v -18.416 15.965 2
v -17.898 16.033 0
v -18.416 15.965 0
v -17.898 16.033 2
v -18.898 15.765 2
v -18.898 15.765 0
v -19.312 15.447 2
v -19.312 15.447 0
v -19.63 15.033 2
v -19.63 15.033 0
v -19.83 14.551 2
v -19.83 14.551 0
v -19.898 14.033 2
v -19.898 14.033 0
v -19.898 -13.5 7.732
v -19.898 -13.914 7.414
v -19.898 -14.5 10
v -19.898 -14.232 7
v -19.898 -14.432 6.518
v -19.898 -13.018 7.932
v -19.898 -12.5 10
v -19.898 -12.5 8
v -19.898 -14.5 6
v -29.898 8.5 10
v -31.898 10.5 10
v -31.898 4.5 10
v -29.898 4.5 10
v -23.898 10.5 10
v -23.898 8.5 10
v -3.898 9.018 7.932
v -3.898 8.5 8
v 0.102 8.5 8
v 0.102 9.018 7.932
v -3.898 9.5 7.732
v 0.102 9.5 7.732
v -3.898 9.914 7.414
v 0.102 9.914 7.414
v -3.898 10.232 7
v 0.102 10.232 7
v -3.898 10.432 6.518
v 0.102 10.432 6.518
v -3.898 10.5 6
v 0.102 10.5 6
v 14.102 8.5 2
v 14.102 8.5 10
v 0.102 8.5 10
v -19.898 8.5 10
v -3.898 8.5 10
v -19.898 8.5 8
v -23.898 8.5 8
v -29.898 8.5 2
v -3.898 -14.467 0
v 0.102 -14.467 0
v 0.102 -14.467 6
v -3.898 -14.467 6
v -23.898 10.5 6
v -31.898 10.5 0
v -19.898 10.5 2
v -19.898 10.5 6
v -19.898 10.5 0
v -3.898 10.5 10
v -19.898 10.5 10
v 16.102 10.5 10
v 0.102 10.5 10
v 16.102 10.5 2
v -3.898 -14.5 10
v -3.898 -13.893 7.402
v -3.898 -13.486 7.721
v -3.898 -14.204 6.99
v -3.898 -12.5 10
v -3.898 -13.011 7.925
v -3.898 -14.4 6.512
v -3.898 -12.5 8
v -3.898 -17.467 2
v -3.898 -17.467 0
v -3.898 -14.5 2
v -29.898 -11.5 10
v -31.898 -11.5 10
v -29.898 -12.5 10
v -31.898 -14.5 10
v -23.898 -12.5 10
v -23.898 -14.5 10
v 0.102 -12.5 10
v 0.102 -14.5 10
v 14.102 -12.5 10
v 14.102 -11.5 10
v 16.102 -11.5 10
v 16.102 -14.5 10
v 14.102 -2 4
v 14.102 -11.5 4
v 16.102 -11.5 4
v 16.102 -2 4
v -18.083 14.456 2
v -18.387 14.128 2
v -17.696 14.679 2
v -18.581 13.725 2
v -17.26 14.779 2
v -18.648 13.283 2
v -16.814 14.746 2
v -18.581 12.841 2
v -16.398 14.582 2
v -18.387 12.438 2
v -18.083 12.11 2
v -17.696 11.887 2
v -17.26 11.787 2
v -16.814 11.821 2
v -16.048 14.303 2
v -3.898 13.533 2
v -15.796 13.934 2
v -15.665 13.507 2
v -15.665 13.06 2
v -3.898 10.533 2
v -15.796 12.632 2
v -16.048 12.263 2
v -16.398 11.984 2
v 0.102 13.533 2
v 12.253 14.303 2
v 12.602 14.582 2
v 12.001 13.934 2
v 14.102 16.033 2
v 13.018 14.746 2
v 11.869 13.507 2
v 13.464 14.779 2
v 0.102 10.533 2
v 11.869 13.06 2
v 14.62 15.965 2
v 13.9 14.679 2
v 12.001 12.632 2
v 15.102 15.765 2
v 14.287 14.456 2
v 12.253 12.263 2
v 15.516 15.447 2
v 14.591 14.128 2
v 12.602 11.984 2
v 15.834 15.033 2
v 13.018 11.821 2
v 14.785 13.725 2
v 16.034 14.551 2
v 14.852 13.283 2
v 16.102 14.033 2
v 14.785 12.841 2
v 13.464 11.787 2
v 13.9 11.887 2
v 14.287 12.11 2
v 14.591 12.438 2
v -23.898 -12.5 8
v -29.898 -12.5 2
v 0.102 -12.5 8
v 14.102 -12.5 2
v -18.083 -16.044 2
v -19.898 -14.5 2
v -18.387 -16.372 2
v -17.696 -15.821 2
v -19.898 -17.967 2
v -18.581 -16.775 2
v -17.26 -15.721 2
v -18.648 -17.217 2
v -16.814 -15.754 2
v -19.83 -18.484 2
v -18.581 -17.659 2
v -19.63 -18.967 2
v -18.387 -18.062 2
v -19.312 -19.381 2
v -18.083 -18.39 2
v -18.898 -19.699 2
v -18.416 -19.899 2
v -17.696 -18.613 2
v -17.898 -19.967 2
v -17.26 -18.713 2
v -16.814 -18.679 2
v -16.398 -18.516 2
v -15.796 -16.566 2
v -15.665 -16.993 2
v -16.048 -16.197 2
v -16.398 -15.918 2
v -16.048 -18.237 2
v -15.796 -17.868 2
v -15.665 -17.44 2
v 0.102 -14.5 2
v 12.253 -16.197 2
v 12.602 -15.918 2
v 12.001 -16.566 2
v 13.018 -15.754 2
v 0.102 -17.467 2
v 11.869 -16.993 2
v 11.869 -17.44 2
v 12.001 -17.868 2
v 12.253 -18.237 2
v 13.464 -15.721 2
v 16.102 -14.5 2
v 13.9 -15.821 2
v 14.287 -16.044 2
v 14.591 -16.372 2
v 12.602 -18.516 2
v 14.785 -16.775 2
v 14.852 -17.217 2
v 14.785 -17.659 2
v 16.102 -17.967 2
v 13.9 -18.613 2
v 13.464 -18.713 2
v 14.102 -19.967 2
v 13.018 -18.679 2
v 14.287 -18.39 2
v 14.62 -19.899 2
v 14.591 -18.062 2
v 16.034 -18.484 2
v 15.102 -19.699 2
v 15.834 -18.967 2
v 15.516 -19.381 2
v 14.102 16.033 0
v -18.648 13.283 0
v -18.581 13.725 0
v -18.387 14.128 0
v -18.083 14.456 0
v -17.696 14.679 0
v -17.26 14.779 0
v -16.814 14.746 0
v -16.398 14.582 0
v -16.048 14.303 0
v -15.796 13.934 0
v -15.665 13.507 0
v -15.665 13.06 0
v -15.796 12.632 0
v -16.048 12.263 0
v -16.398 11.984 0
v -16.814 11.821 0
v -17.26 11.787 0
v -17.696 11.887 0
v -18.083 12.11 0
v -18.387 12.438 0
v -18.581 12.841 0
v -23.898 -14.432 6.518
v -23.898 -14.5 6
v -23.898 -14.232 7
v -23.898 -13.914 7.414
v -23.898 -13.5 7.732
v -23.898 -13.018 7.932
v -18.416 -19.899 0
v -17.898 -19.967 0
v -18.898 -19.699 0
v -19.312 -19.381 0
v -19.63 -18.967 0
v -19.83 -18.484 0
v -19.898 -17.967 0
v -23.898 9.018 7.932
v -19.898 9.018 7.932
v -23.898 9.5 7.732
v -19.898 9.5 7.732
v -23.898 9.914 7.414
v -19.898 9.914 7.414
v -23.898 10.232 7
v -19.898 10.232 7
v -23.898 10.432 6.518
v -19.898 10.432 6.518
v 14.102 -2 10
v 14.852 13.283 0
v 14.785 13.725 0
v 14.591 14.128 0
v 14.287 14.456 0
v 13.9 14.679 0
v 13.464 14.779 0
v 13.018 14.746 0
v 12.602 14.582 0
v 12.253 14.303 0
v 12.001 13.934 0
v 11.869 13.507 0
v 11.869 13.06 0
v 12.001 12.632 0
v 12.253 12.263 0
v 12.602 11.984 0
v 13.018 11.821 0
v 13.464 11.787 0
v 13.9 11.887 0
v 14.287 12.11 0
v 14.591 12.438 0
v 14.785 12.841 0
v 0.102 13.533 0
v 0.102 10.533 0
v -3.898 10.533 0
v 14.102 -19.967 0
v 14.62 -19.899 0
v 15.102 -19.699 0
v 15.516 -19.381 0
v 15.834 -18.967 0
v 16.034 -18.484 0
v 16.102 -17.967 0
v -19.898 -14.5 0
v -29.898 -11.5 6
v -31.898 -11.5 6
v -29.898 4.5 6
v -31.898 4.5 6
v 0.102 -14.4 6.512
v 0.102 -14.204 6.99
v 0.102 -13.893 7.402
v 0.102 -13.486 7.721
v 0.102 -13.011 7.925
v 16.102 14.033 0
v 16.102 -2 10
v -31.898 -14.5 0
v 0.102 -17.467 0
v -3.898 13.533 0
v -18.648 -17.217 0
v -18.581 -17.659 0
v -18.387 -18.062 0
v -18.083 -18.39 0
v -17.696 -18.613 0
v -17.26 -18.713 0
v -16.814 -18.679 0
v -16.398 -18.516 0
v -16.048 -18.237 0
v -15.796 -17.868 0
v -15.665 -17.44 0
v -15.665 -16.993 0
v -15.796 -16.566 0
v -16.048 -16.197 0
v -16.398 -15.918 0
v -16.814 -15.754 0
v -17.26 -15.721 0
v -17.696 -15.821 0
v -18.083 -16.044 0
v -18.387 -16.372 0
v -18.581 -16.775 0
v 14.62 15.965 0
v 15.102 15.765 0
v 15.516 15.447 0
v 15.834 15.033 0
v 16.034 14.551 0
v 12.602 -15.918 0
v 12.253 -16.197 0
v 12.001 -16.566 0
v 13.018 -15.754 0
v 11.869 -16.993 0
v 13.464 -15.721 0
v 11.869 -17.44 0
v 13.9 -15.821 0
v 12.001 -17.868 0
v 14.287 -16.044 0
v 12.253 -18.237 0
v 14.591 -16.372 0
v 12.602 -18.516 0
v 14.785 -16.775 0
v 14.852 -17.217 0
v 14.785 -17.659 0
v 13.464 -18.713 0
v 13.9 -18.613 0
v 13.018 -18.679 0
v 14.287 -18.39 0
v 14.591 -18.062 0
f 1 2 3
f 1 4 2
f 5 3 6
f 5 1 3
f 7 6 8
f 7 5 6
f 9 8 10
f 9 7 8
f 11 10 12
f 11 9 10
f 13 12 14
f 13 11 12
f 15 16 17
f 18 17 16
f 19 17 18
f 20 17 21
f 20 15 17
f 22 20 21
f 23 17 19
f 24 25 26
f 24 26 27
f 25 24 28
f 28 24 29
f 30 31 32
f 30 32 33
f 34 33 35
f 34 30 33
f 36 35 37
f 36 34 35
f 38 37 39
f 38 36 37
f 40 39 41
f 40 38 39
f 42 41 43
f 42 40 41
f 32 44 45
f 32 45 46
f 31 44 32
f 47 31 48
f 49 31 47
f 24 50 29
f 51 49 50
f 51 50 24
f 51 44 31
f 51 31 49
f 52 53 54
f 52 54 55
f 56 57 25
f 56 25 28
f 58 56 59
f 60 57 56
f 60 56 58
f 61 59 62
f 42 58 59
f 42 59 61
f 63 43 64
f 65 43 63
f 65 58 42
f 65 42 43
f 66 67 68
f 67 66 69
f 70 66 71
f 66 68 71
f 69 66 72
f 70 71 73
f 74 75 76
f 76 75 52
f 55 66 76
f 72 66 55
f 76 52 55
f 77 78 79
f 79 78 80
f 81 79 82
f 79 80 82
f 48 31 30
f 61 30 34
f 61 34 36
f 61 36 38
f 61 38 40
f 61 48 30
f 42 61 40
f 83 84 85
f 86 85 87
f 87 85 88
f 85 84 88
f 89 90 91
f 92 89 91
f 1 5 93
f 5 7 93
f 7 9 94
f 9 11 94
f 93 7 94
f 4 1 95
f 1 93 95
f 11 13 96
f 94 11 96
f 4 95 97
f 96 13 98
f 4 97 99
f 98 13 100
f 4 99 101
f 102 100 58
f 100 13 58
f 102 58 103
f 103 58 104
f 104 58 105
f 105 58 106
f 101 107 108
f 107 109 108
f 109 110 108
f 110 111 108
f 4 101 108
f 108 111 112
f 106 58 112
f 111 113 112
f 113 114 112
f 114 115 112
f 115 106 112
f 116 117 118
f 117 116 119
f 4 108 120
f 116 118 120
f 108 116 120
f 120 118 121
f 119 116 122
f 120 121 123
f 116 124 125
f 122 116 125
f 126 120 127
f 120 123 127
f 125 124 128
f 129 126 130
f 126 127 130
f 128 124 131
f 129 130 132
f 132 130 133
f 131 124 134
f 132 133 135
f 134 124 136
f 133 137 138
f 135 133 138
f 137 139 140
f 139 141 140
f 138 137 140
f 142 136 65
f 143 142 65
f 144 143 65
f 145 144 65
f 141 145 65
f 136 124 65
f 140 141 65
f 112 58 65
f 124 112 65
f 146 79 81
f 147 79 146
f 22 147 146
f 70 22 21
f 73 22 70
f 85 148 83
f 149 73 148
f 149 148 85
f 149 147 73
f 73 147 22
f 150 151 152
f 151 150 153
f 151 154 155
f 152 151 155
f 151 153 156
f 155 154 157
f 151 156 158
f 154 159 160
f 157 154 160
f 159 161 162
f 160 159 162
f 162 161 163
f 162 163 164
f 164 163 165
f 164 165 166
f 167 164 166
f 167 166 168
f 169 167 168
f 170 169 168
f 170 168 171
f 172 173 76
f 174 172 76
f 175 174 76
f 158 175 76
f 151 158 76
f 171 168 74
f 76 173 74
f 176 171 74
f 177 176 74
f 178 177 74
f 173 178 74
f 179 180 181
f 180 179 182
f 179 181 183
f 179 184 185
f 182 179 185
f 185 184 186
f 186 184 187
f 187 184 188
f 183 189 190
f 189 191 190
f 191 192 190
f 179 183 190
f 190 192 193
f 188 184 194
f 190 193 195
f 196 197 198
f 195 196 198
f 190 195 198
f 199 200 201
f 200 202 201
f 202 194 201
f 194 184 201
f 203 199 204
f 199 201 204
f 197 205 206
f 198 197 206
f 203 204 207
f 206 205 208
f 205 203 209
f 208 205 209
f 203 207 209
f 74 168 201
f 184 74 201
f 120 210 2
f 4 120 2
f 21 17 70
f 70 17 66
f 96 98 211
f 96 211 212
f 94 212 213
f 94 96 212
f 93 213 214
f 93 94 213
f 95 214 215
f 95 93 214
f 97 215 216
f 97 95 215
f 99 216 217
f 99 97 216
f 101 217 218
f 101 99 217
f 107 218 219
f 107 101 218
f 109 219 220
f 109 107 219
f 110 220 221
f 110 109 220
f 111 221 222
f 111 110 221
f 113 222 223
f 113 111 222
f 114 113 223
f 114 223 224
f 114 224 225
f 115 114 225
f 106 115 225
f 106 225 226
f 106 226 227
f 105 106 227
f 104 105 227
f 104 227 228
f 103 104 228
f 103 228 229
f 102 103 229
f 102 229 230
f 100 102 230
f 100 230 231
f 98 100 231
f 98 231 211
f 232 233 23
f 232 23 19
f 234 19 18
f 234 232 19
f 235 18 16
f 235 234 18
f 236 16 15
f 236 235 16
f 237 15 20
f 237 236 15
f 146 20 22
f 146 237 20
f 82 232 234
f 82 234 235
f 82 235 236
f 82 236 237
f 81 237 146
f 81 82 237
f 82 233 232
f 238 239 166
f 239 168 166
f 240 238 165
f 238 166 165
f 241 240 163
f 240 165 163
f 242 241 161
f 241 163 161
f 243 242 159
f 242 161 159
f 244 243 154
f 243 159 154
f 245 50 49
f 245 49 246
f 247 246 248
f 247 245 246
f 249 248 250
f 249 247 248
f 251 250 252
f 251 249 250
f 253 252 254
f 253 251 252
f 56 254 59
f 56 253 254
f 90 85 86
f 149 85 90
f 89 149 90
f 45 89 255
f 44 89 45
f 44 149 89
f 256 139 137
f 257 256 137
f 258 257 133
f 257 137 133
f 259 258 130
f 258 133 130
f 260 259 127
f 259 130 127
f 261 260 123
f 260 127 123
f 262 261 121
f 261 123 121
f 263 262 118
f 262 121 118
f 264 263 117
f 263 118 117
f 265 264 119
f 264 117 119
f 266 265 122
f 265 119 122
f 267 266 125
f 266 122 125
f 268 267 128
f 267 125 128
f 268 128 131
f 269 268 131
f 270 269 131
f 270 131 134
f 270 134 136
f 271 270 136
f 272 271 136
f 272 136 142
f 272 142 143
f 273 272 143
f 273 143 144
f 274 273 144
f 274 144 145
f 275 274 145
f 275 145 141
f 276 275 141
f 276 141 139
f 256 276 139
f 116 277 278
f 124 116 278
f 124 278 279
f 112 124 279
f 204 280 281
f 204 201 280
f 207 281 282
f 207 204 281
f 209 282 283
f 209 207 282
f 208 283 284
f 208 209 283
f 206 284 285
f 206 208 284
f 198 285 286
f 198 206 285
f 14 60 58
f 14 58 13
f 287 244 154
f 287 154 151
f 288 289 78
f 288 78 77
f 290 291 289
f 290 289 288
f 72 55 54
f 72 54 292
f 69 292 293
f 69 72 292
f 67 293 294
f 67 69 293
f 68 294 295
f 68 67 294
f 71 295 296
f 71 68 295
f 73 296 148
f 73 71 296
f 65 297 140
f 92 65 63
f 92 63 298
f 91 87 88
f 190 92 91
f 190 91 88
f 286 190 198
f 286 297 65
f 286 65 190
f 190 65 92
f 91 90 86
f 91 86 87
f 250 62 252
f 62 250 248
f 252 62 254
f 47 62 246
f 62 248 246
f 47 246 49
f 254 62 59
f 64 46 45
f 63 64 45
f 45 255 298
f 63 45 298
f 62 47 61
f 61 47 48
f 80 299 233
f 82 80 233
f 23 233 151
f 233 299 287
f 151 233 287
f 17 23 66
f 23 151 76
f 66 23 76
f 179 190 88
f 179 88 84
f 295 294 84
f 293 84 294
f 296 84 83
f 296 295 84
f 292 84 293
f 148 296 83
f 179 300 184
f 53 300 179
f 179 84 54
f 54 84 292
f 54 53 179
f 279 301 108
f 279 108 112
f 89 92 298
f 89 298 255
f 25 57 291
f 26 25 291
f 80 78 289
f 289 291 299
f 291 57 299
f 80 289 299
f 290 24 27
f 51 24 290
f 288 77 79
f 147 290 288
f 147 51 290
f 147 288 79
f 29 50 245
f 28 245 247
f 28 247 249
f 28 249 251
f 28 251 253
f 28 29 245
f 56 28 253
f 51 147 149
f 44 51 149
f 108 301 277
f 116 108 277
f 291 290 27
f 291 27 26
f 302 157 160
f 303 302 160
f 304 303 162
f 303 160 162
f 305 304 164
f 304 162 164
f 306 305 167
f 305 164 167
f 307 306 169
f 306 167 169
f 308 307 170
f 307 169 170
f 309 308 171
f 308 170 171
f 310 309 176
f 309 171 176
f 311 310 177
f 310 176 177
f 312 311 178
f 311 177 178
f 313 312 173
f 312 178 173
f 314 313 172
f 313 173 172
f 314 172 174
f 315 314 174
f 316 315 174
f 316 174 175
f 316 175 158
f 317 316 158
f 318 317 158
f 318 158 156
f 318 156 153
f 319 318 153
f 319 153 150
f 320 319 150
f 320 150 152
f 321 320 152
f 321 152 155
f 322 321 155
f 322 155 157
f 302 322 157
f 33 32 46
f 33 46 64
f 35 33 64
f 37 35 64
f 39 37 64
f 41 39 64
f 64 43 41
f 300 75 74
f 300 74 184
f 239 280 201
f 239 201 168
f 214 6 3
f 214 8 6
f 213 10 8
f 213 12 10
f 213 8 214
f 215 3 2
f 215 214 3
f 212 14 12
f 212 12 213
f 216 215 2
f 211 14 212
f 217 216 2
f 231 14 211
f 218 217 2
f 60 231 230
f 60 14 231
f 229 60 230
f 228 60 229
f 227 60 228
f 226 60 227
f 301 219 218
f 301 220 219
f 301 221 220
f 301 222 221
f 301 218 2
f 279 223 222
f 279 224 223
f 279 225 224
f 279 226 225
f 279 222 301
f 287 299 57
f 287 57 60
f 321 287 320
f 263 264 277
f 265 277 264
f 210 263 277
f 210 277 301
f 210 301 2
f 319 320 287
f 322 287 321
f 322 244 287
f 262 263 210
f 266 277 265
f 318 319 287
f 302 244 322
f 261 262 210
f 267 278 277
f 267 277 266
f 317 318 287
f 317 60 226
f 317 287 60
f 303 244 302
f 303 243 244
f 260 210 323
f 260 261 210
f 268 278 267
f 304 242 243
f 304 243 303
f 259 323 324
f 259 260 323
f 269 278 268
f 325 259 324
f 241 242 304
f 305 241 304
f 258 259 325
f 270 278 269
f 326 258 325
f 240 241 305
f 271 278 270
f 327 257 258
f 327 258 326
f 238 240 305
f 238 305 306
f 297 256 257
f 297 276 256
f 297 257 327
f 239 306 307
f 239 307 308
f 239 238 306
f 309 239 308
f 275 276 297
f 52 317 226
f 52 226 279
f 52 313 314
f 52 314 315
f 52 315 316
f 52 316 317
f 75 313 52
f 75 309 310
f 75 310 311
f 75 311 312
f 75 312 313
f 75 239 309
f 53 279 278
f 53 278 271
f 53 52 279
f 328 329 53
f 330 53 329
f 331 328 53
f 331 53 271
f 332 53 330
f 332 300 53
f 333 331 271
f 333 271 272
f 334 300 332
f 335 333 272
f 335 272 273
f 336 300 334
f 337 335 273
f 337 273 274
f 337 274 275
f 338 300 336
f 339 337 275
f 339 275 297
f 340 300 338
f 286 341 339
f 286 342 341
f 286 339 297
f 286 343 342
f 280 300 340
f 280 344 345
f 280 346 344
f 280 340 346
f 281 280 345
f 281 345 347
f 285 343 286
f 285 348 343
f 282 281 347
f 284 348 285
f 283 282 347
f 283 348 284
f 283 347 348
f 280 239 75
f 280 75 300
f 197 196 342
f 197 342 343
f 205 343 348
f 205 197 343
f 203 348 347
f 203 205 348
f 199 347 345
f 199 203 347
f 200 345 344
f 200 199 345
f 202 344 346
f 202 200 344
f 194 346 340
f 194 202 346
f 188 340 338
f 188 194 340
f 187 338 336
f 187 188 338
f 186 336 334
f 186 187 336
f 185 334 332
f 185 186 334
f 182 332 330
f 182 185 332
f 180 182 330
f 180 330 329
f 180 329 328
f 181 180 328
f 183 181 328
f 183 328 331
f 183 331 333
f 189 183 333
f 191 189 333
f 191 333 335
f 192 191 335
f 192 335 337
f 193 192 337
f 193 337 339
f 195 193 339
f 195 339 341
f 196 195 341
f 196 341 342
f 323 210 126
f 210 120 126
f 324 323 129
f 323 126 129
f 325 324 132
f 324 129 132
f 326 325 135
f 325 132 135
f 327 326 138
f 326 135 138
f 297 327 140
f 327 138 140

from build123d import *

# Parameters (mm, degrees)
F1_DEPTH     = 2
F2_R         = 2
F3_D         = 3
F6_W         = 2
F6_H         = 9.5
F7_DEPTH     = 2
F6_W_2       = 4
F6_H_2       = 2
F6_H_3       = 1.9668334348
F8_DEPTH     = 8
F6_W_3       = 16
F9_DEPTH     = 10
F10_T1_DEPTH = 4
F10_T3_DEPTH = 4
F11_DEPTH    = 4
F6_H_4       = 16
F12_DEPTH    = 6


# Not quite as in the source:
# - a fillet or chamfer that OpenCascade refuses, or shapes differently, is made with other operations: its cross-section is extruded or revolved along the edge and cut away or added
# - a feature names something its author has since deleted; it is built from what else it names


with BuildPart() as f1:
    # F0 (on Top) → F1 (new body)
    with BuildSketch(Plane.XY):
        Polygon((-19.8978664808, -19.9668334348), (-1.8978664808, -19.9668334348), (-1.8978664808, -17.4668334348), (-3.8978664808, -17.4668334348), (-3.8978664808, -14.4668334348), (-1.8978664808, -14.4668334348), (-1.8978664808, -1.9668334348), (-19.8978664808, -1.9668334348), align=None)
    extrude(amount=F1_DEPTH)

    # F2
    f2_edges = [f1.edges().sort_by_distance(p)[0] for p in [
        (-19.897866, -19.966833, 1),
    ]]
    fillet(f2_edges, radius=F2_R)

    # F3 (through all)
    with Locations(Plane(origin=(0, 0, 0), x_dir=(1, 0, 0), z_dir=(0, 0, -1))):
        with Locations((-17.1478664808, 17.2168334348)):
            Hole(F3_D / 2)

    # F4: F1 across face


with BuildPart() as f1_1:
    add(f1.part)
    add(f1.part.mirror(Plane(origin=(-1.8978664808, -8.2168334348, 1), x_dir=(0, 1, 0), z_dir=(1, 0, 0))))

    # F5: F1 across face


with BuildPart() as f1_2:
    add(f1_1.part)
    add(f1_1.part.mirror(Plane(origin=(-1.8978664808, -1.9668334348, 1), x_dir=(-1, 0, 0), z_dir=(0, 1, 0))))

    # F6 (on face) → F7 (join)
    with BuildSketch(Plane(origin=(0, 0, 0), x_dir=(1, 0, 0), z_dir=(0, 0, -1))):
        Polygon((-29.8978664808, -8.5), (-23.8978664808, -8.5), (-19.8978664808, -8.5), (-19.8978664808, 12.5), (-23.8978664808, 12.5), (-29.8978664808, 12.5), (-29.8978664808, 11.5), (-29.8978664808, -4.5), align=None)
        with Locations((15.1021335192, 6.75)):
            Rectangle(F6_W, F6_H)
        Polygon((-19.8978664808, 12.5), (-19.8978664808, -8.5), (-3.8978664808, -8.5), (0.1021335192, -8.5), (14.1021335192, -8.5), (14.1021335192, 2), (14.1021335192, 11.5), (14.1021335192, 12.5), (0.1021335192, 12.5), (-3.8978664808, 12.5), align=None)
    extrude(amount=-F7_DEPTH)

    # F6 (on face) → F8 (join)
    with BuildSketch(Plane(origin=(0, 0, 0), x_dir=(1, 0, 0), z_dir=(0, 0, -1))):
        with Locations((-1.8978664808, -9.5)):
            Rectangle(F6_W_2, F6_H_2)
        with Locations((-1.8978664808, 13.4834167174)):
            Rectangle(F6_W_2, F6_H_3)
        with Locations((-21.8978664808, 13.5)):
            Rectangle(F6_W_2, F6_H_2)
        with Locations((-21.8978664808, -9.5)):
            Rectangle(F6_W_2, F6_H_2)
    extrude(amount=-F8_DEPTH)

    # F6 (on face) → F9 (join)
    with BuildSketch(Plane(origin=(0, 0, 0), x_dir=(1, 0, 0), z_dir=(0, 0, -1))):
        Polygon((-31.8978664808, -10.5), (-23.8978664808, -10.5), (-23.8978664808, -8.5), (-29.8978664808, -8.5), (-29.8978664808, -4.5), (-31.8978664808, -4.5), align=None)
        Polygon((0.1021335192, -8.5), (0.1021335192, -10.5), (16.1021335192, -10.5), (16.1021335192, 2), (14.1021335192, 2), (14.1021335192, -8.5), align=None)
        Polygon((0.1021335192, 14.4668334348), (0.1021335192, 12.5), (14.1021335192, 12.5), (14.1021335192, 11.5), (16.1021335192, 11.5), (16.1021335192, 14.5), (0.1021335192, 14.5), align=None)
        Polygon((-19.8978664808, 14.5), (-19.8978664808, 12.5), (-3.8978664808, 12.5), (-3.8978664808, 14.4668334348), (-3.8978664808, 14.5), align=None)
        Polygon((-31.8978664808, 14.5), (-31.8978664808, 11.5), (-29.8978664808, 11.5), (-29.8978664808, 12.5), (-23.8978664808, 12.5), (-23.8978664808, 14.5), align=None)
        with Locations((-11.8978664808, -9.5)):
            Rectangle(F6_W_3, F6_H_2)
    extrude(amount=-F9_DEPTH)

    # F10: fillet of radius 2 on 4 edges, made by hand

    # F10_s2 → F10_t1 (cut)
    with BuildSketch(Plane.YZ.offset(-3.8978664808)):
        with BuildLine():
            ThreePointArc((-14.4668334348, 6), (-13.8810469972, 7.4142135624), (-12.4668334348, 8))
            Line((-12.4668334348, 8), (-14.4668334348, 8))
            Line((-14.4668334348, 8), (-14.4668334348, 6))
        make_face()
        with BuildLine():
            ThreePointArc((8.5, 8), (9.9142135624, 7.4142135624), (10.5, 6))
            Line((10.5, 6), (10.5, 8))
            Line((10.5, 8), (8.5, 8))
        make_face()
    extrude(amount=F10_T1_DEPTH, mode=Mode.SUBTRACT)

    # F10_s4 → F10_t3 (cut)
    with BuildSketch(Plane.YZ.offset(-23.8978664808)):
        with BuildLine():
            ThreePointArc((8.5, 8), (9.9142135624, 7.4142135624), (10.5, 6))
            Line((10.5, 6), (10.5, 8))
            Line((10.5, 8), (8.5, 8))
        make_face()
        with BuildLine():
            ThreePointArc((-14.5, 6), (-13.9142135624, 7.4142135624), (-12.5, 8))
            Line((-12.5, 8), (-14.5, 8))
            Line((-14.5, 8), (-14.5, 6))
        make_face()
    extrude(amount=F10_T3_DEPTH, mode=Mode.SUBTRACT)

    # F6 (on face) → F11 (join)
    with BuildSketch(Plane(origin=(0, 0, 0), x_dir=(1, 0, 0), z_dir=(0, 0, -1))):
        with Locations((15.1021335192, 6.75)):
            Rectangle(F6_W, F6_H)
    extrude(amount=-F11_DEPTH)

    # F6 (on face) → F12 (join)
    with BuildSketch(Plane(origin=(0, 0, 0), x_dir=(1, 0, 0), z_dir=(0, 0, -1))):
        with Locations((-30.8978664808, 3.5)):
            Rectangle(F6_W, F6_H_4)
    extrude(amount=-F12_DEPTH)


solid = f1_2.part
